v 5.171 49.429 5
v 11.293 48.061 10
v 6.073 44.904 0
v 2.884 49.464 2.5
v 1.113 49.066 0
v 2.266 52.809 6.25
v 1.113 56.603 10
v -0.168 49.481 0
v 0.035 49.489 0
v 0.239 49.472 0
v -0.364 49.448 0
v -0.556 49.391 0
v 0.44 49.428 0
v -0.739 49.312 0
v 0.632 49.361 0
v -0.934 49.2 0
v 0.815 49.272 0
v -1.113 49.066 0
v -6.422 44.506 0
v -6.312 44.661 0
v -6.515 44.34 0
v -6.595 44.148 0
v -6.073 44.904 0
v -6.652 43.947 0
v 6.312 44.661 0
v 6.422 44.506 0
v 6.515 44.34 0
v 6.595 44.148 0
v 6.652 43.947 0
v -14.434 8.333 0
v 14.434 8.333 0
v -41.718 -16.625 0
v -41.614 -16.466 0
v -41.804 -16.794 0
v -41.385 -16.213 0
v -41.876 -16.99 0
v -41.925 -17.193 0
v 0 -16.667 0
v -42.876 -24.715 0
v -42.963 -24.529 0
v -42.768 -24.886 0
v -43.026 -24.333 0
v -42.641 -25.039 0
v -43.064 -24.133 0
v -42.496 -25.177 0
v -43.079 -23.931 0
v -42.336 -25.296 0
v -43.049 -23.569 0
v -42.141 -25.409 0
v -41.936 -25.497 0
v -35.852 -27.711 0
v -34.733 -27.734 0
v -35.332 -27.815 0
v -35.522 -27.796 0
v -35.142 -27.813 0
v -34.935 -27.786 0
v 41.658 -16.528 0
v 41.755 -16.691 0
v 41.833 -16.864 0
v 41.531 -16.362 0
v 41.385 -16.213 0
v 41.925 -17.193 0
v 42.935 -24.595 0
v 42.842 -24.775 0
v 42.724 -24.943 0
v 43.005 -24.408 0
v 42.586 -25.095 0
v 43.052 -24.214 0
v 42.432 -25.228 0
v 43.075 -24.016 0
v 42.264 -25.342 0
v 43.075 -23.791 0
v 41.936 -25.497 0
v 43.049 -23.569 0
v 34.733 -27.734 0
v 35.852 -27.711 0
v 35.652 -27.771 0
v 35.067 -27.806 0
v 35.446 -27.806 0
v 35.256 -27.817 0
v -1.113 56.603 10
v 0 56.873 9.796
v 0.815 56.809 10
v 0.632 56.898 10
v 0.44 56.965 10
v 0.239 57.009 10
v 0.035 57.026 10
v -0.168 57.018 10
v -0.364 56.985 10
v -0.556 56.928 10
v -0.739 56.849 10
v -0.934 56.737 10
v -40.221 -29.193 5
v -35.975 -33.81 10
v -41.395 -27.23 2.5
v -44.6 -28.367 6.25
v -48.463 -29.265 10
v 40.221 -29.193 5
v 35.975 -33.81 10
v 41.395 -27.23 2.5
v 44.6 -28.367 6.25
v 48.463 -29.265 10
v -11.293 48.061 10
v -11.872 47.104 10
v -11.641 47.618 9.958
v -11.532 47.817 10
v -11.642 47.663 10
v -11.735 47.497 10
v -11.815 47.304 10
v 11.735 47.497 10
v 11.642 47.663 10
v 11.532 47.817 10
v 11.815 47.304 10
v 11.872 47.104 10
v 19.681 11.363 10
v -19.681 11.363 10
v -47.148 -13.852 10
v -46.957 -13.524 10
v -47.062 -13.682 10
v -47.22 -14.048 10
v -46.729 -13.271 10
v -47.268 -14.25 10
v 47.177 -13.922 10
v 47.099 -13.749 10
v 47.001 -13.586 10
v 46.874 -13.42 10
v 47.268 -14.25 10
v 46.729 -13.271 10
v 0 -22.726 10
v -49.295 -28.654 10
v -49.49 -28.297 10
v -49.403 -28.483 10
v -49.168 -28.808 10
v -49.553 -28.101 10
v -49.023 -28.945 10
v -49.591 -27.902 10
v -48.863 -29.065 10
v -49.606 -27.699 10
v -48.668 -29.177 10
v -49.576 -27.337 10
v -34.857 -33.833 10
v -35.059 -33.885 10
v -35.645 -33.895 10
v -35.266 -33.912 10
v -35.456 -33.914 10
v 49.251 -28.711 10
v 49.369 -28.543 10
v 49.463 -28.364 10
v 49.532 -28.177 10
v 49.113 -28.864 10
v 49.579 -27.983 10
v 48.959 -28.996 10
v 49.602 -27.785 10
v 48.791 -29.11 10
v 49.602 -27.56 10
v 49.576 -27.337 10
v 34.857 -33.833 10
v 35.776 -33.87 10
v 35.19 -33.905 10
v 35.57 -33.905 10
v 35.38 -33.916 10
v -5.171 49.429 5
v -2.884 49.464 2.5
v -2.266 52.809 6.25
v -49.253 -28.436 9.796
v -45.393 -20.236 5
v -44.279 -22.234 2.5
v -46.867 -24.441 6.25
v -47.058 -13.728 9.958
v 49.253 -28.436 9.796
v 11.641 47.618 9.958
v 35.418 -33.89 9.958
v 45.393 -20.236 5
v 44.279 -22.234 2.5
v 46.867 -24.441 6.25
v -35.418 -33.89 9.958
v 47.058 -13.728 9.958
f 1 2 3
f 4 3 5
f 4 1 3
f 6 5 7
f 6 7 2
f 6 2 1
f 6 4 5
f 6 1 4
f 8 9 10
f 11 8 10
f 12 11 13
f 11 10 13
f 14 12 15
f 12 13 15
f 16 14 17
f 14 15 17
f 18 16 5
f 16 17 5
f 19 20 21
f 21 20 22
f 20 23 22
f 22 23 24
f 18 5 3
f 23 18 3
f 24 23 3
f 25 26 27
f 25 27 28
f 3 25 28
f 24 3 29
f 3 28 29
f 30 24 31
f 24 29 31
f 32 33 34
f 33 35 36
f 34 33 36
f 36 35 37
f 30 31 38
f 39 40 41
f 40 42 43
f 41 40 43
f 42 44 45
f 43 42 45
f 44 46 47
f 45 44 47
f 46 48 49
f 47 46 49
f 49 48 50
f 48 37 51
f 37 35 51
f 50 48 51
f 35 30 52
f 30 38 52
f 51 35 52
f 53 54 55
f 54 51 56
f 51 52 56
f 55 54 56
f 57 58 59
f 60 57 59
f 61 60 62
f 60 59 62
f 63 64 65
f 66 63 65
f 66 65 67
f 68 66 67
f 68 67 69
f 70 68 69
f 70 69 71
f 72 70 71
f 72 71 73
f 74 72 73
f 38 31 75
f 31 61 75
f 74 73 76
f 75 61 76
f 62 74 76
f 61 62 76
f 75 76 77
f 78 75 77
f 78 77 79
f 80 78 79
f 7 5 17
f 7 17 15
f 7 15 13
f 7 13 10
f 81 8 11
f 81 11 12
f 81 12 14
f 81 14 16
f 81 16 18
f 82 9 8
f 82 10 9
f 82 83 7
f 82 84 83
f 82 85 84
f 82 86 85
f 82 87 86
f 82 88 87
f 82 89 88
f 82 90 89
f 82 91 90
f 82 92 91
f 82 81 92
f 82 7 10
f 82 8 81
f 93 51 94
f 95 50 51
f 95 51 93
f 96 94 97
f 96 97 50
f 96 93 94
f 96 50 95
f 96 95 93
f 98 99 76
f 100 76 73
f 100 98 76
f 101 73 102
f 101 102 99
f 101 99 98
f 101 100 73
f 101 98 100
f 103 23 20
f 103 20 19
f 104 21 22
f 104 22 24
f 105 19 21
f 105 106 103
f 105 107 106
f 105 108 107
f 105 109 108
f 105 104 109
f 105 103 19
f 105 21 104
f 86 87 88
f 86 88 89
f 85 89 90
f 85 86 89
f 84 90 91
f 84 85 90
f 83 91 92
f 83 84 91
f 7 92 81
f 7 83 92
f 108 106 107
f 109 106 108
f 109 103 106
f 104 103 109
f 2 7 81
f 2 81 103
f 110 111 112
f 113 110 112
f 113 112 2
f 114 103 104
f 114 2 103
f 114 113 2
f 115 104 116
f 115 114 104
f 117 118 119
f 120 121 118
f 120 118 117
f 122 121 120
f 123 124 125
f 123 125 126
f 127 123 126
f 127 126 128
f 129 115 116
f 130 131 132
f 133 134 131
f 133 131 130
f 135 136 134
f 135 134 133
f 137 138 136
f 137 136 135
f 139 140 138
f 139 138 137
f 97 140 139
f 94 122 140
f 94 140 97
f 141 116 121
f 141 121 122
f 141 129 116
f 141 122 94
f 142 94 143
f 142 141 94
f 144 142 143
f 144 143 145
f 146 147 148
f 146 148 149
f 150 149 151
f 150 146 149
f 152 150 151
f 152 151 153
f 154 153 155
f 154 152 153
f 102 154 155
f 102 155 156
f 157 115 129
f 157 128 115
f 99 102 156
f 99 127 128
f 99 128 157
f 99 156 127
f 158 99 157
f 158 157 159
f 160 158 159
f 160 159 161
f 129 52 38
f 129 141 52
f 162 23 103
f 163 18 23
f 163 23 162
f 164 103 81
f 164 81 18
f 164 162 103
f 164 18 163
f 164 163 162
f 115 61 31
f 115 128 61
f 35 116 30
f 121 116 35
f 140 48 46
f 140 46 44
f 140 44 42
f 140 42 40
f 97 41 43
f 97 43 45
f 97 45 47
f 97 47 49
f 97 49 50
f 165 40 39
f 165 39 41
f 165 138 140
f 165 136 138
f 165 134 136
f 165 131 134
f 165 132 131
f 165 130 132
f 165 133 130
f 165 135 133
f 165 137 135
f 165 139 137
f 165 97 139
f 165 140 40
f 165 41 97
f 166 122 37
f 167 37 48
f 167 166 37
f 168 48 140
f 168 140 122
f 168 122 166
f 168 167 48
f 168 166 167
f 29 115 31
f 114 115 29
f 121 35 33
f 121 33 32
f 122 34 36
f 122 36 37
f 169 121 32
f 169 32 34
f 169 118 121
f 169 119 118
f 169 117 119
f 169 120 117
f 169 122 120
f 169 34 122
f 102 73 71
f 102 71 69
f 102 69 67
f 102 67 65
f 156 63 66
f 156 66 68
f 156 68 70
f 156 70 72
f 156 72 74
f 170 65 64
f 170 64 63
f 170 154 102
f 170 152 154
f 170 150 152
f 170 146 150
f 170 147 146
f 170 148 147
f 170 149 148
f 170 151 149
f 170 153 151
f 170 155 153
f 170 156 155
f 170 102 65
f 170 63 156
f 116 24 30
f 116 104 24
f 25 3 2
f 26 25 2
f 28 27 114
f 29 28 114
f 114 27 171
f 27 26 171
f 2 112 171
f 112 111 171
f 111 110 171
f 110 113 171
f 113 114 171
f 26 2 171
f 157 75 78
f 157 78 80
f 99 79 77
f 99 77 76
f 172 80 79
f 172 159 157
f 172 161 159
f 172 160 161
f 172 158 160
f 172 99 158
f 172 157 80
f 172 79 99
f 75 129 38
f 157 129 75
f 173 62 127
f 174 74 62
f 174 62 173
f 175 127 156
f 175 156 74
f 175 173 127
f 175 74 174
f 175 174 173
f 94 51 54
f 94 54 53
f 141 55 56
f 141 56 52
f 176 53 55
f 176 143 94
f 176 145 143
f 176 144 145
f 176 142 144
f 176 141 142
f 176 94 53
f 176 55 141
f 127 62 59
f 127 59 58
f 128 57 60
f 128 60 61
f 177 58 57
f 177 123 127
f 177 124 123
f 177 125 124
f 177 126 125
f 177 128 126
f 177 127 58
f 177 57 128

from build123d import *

# Parameters (mm, degrees)
F0_R     = 10
F1_DEPTH = 10
F1_TAPER = -30
F2_R     = 2


with BuildPart() as f1:
    # F0 (on Top) → F1 (new body)
    with BuildSketch(Plane.XY):
        Polygon((6.5256503992, 44.5243291569), (0, 50), (-6.5256503992, 44.5243291569), (-14.4337567297, 8.3333333333), (-41.8220253359, -16.6107855565), (-43.3012701892, -25), (-35.2963749367, -27.9135436003), (0, -16.6666666667), (35.2963749367, -27.9135436003), (43.3012701892, -25), (41.8220253359, -16.6107855565), (14.4337567297, 8.3333333333), align=None)
        Circle(F0_R, mode=Mode.SUBTRACT)
        Circle(F0_R)
    extrude(amount=F1_DEPTH, taper=F1_TAPER)

    # F2
    f2_edges = [f1.edges().sort_by_distance(p)[0] for p in [
        (0, 53.768386, 5),
        (9.135628, 46.102684, 5),
        (-9.135628, 46.102684, 5),
        (44.49391, -15.139656, 5),
        (46.564788, -26.884193, 5),
        (35.358282, -30.963028, 5),
        (-44.49391, -15.139656, 5),
        (-46.564788, -26.884193, 5),
        (-35.358282, -30.963028, 5),
    ]]
    fillet(f2_edges, radius=F2_R)


solid = f1.part
